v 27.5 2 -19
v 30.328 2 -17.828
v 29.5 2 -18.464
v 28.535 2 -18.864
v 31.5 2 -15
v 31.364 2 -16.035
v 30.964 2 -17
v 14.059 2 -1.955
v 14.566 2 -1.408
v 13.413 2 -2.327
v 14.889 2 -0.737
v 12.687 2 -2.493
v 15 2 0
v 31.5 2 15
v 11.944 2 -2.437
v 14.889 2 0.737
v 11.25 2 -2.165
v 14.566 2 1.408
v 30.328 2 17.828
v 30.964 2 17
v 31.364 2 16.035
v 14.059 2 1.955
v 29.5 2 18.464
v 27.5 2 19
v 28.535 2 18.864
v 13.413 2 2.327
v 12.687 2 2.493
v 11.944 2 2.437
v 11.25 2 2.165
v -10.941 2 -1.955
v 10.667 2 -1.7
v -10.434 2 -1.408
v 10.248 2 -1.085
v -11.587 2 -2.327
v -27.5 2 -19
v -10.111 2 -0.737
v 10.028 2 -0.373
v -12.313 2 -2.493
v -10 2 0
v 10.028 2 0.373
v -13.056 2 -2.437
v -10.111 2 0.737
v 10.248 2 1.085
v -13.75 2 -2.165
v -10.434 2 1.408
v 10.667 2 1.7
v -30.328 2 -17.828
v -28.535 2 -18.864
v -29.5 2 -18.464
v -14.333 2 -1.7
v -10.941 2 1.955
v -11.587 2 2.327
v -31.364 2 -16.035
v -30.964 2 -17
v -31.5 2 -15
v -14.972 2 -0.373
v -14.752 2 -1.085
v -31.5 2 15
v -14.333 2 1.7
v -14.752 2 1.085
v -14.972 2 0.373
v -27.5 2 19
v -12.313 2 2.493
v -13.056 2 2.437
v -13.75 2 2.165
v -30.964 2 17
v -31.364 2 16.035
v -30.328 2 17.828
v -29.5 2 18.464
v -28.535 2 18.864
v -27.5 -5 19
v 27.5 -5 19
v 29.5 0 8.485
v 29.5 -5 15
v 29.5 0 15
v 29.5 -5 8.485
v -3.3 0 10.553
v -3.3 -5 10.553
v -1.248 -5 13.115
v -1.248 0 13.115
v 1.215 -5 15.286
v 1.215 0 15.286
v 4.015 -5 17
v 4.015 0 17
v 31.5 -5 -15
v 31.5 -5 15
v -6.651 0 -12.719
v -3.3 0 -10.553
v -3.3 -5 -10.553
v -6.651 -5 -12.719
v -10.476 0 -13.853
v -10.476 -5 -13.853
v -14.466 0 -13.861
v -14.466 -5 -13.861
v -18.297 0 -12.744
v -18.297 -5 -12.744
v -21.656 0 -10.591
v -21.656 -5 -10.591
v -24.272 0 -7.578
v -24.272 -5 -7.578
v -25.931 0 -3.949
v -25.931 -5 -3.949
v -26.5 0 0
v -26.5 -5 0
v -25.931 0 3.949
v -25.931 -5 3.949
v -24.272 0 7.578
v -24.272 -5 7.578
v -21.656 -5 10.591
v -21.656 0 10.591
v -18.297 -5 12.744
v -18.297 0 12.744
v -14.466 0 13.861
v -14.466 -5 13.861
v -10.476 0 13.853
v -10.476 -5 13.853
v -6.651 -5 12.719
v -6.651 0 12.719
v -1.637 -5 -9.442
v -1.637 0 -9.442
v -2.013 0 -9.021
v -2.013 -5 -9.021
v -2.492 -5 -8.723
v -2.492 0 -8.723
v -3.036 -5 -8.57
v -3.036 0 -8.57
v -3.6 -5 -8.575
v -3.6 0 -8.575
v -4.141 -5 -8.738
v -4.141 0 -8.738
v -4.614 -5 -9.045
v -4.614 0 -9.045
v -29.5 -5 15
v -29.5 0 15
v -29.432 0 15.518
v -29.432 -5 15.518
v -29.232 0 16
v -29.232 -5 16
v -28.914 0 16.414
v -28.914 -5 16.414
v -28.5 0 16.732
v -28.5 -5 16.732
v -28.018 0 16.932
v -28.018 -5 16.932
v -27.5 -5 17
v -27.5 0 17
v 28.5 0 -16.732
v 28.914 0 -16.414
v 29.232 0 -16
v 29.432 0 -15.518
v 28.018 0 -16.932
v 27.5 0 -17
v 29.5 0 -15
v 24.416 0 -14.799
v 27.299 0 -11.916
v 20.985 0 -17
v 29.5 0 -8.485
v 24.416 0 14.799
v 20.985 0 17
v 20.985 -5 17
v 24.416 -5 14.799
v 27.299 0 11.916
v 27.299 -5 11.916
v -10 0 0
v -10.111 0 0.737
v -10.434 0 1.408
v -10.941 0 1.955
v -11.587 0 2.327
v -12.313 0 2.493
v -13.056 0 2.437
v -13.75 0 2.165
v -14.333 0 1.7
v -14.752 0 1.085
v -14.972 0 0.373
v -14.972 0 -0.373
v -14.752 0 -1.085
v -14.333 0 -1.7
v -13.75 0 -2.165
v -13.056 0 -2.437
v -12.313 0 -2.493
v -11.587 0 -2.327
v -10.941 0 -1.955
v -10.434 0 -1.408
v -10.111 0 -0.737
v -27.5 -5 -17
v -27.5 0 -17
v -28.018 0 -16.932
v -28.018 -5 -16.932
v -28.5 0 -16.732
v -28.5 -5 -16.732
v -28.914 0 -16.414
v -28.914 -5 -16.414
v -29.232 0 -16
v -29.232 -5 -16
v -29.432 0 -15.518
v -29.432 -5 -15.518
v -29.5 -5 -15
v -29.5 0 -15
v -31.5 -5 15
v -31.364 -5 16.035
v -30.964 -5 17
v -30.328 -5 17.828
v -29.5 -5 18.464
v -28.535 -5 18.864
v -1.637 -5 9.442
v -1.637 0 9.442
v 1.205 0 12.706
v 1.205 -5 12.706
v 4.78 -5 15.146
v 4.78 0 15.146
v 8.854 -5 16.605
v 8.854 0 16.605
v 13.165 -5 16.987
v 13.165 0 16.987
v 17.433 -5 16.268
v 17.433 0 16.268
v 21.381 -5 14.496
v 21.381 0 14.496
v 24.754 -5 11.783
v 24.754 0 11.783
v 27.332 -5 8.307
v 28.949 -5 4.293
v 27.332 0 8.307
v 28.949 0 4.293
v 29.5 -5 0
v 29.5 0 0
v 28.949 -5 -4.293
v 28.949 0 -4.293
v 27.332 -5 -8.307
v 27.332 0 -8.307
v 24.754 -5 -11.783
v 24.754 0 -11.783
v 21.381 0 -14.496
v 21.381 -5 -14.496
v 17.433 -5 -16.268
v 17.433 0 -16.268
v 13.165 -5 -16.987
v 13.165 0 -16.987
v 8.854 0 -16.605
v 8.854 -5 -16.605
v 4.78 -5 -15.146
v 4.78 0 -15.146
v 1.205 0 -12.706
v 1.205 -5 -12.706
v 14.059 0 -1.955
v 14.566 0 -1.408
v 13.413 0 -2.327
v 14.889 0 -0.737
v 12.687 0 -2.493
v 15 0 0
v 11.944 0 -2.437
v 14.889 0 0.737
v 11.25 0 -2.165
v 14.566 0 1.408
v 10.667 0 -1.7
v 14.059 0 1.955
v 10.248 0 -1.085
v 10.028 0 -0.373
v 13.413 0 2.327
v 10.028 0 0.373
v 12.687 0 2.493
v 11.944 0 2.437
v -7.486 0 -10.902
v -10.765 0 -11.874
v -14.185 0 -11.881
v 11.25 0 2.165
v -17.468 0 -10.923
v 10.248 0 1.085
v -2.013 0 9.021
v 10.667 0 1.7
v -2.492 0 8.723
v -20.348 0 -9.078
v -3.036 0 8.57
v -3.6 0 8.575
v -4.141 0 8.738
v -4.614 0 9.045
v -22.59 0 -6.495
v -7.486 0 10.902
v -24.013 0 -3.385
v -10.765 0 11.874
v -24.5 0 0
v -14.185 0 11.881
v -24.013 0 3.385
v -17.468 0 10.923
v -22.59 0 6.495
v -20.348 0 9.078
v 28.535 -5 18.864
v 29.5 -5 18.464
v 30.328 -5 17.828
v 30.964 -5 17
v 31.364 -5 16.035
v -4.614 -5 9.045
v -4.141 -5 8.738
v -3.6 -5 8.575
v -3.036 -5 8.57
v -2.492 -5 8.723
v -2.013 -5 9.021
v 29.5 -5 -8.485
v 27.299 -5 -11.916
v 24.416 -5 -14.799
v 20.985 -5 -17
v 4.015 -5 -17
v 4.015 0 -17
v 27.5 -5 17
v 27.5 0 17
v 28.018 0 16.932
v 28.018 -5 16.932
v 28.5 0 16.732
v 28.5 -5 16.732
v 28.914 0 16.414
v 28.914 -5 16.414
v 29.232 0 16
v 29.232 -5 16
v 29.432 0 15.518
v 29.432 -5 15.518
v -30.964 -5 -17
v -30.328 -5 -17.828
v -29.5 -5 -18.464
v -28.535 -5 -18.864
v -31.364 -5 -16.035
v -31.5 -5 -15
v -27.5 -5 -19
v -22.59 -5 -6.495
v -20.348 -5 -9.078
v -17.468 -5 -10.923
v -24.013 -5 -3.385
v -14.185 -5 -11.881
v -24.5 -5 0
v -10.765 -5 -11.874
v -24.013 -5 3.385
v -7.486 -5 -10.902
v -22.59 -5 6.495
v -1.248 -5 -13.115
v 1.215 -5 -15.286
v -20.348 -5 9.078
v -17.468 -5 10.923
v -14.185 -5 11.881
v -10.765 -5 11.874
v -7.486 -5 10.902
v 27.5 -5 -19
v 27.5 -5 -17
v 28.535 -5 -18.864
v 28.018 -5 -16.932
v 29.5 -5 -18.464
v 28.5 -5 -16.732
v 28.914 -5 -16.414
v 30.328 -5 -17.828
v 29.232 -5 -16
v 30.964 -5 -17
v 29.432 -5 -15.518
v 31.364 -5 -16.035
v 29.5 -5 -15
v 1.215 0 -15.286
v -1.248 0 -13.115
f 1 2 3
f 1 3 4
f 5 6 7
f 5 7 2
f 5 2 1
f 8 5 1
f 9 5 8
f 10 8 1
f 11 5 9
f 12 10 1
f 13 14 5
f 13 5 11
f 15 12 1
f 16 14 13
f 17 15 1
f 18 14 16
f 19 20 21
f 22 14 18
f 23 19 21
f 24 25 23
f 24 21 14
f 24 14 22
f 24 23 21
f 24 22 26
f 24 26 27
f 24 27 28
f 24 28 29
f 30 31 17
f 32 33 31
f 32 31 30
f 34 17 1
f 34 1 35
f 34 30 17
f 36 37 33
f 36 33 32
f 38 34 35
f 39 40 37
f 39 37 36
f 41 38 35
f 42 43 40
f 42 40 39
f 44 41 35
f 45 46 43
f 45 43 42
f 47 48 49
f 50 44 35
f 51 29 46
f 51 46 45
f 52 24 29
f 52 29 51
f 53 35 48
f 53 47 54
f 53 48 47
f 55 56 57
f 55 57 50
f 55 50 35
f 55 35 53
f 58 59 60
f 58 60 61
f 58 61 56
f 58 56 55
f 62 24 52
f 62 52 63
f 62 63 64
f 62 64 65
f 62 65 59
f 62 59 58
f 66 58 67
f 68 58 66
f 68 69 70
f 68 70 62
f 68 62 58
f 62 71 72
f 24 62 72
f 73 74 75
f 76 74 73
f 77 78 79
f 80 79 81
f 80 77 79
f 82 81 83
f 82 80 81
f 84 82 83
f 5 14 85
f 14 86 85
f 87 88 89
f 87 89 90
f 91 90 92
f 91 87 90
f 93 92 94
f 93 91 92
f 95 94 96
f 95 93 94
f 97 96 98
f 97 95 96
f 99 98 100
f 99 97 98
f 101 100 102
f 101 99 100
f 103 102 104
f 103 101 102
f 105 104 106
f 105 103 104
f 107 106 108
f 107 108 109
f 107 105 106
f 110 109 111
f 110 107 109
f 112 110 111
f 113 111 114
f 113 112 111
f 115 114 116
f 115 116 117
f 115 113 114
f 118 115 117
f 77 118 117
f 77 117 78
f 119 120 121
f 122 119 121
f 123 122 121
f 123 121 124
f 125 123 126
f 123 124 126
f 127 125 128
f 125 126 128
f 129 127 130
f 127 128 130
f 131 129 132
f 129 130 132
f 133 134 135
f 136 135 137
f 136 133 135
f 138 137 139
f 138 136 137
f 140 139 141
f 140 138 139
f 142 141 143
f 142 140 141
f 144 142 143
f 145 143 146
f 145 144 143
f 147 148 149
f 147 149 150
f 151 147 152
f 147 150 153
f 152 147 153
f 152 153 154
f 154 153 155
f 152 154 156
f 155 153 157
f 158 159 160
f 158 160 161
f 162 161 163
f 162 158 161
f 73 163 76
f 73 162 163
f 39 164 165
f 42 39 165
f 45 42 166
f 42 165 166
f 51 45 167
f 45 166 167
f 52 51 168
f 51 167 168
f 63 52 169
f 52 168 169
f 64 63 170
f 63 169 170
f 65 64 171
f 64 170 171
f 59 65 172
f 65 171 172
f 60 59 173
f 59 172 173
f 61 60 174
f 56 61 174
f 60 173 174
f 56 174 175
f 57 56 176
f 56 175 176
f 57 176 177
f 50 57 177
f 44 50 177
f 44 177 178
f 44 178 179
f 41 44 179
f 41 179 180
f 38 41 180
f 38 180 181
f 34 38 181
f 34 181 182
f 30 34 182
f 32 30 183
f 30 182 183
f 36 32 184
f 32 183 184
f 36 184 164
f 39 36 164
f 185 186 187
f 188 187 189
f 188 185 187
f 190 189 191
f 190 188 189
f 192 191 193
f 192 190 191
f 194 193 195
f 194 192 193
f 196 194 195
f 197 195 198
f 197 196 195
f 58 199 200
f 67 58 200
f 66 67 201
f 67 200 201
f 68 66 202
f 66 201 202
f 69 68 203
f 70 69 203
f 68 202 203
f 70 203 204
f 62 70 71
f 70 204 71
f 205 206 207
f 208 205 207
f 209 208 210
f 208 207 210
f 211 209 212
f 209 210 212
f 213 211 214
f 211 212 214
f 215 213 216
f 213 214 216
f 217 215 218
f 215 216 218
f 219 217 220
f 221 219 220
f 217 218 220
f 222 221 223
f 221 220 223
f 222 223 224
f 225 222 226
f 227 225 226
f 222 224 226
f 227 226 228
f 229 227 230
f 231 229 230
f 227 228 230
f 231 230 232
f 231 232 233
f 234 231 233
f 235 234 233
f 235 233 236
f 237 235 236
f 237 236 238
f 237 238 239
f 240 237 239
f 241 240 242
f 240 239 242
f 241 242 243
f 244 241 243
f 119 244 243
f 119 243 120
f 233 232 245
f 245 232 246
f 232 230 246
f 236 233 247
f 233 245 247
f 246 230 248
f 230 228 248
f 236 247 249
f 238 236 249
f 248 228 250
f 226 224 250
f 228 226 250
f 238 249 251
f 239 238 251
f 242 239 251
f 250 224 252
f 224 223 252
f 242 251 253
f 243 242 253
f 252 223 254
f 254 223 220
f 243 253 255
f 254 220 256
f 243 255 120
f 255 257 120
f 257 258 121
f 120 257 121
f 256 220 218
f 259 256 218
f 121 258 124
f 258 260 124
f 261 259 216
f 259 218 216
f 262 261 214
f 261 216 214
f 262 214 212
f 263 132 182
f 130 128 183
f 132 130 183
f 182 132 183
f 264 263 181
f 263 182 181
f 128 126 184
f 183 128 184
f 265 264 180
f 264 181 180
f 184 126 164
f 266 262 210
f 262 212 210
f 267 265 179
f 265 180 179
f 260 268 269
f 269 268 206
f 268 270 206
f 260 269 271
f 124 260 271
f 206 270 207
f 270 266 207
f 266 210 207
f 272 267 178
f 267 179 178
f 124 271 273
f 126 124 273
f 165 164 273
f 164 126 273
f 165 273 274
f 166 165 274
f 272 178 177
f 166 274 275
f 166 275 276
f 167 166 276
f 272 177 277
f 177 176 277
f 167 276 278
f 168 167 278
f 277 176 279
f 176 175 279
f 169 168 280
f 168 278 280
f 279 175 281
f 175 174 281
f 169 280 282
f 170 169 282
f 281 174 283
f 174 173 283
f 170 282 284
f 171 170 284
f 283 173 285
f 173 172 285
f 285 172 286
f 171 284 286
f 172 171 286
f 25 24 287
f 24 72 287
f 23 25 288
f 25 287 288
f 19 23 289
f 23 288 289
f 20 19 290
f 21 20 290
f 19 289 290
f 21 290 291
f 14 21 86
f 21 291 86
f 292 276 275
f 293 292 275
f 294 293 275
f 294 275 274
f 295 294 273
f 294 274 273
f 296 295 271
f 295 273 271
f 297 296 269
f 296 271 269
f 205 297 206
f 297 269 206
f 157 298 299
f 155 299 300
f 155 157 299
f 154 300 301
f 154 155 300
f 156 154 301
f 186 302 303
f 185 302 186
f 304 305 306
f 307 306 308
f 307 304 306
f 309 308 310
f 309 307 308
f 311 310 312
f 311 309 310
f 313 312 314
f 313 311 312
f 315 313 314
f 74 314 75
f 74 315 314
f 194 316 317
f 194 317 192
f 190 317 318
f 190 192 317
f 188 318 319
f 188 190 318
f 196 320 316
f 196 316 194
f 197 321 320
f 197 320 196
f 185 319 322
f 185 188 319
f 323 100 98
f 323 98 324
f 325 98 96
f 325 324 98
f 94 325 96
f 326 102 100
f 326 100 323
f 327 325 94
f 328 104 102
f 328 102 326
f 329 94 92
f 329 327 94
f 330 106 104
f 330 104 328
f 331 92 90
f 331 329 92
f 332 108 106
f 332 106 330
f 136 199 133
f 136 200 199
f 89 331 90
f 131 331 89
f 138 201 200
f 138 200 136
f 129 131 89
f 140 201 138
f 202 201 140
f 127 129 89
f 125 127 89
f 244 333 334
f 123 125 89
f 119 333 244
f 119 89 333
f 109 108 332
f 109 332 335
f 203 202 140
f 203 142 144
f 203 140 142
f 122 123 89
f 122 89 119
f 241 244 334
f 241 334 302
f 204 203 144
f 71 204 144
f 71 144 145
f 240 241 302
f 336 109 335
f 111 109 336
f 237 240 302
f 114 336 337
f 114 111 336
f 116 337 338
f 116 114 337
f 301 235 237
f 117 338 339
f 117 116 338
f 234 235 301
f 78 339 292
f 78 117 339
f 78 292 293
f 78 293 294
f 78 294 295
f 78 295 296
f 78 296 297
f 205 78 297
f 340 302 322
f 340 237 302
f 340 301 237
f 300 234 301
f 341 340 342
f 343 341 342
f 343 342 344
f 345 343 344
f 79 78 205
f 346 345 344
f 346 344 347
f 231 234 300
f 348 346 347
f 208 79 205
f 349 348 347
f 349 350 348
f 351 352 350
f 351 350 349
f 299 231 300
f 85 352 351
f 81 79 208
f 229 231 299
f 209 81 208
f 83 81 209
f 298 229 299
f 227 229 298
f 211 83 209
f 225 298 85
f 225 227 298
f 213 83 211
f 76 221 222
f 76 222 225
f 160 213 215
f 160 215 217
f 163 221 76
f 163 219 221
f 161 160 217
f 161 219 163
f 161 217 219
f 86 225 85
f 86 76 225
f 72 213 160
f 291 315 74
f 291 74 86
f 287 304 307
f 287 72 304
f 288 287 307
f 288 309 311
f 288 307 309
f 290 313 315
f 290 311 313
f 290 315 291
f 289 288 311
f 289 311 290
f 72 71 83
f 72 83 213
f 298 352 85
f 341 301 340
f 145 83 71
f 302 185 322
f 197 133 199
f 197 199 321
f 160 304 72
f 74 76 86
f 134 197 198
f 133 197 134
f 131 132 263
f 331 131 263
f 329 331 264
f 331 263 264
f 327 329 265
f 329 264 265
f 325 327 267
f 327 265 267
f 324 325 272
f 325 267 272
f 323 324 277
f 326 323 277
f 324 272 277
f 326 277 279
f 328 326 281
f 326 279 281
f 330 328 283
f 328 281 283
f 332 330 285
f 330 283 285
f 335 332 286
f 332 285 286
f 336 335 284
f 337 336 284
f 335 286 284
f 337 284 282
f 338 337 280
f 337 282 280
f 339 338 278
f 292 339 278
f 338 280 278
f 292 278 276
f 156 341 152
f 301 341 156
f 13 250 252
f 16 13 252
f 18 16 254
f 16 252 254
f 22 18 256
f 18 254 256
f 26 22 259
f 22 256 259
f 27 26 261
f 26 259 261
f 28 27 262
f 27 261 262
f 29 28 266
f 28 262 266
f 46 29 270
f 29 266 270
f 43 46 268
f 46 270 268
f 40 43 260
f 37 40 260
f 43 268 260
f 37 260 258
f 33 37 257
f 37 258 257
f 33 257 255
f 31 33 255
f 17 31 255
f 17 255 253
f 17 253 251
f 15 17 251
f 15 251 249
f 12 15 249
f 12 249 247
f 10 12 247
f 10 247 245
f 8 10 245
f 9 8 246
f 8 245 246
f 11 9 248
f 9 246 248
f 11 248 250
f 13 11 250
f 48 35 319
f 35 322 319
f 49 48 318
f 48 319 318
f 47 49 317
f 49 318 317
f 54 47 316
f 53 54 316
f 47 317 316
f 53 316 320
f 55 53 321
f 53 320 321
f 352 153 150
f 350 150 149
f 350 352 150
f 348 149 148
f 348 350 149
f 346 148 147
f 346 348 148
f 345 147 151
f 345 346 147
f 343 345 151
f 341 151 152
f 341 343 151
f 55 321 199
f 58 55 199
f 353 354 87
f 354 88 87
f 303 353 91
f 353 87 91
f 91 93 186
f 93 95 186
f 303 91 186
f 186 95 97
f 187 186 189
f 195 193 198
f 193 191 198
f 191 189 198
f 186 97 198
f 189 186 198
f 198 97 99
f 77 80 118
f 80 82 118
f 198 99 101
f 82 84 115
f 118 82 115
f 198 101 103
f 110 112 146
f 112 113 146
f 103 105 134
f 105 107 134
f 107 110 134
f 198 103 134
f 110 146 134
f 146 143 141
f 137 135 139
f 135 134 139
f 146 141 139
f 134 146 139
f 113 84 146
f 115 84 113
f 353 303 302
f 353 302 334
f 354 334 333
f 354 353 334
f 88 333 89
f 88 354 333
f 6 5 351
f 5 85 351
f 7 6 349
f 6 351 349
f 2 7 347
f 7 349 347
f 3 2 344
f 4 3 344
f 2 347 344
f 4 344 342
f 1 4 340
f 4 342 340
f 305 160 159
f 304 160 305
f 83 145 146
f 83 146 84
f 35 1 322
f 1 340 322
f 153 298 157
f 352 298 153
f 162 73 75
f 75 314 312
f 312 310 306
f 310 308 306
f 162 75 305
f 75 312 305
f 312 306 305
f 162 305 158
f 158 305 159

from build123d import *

# Parameters (mm, degrees)
F1_DEPTH     = 5
F3_DEPTH     = 2
F4_T         = 2
F4_T4_ANGLE  = 97.3436104927
F4_T6_ANGLE  = 292.5225547035
F4_T8_ANGLE  = 97.3436104927
F4_T10_ANGLE = 262.1646662819
F5_R         = 2.5
F6_DEPTH     = 2


# Not quite as in the source:
# - a shell that OpenCascade refuses in one call is made with other operations: the cavity is built on its own and cut out


with BuildPart() as f1:
    # F0 (on Front) → F1 (new body)
    with BuildSketch(Plane.XZ):
        with BuildLine():
            ThreePointArc((31.5, 15), (30.3284271247, 17.8284271247), (27.5, 19))
            Line((27.5, 19), (-27.5, 19))
            ThreePointArc((-27.5, 19), (-30.3284271247, 17.8284271247), (-31.5, 15))
            Line((-31.5, 15), (-31.5, -15))
            ThreePointArc((-31.5, -15), (-30.3284271247, -17.8284271247), (-27.5, -19))
            Line((-27.5, -19), (27.5, -19))
            ThreePointArc((27.5, -19), (30.3284271247, -17.8284271247), (31.5, -15))
            Line((31.5, -15), (31.5, 15))
        make_face()
        with BuildLine():
            ThreePointArc((-1.6368421053, 9.4419116333), (29.5, 0), (-1.6368421053, -9.4419116333))
            ThreePointArc((-1.6368421053, -9.4419116333), (-3.0358514886, -8.5702451163), (-4.6142857143, -9.0451926571))
            ThreePointArc((-4.6142857143, -9.0451926571), (-24.5, 0), (-4.6142857143, 9.0451926571))
            ThreePointArc((-4.6142857143, 9.0451926571), (-3.0358514886, 8.5702451163), (-1.6368421053, 9.4419116333))
        make_face(mode=Mode.SUBTRACT)
    extrude(amount=F1_DEPTH)

    # F2 (on face) → F3 (join)
    with BuildSketch(Plane(origin=(0, 0, 0), x_dir=(-1, 0, 0), z_dir=(0, 1, 0))):
        with BuildLine():
            Line((27.5, 19), (-27.5, 19))
            ThreePointArc((-27.5, 19), (-30.3284271247, 17.8284271247), (-31.5, 15))
            Line((-31.5, 15), (-31.5, -15))
            ThreePointArc((-31.5, -15), (-30.3284271247, -17.8284271247), (-27.5, -19))
            Line((-27.5, -19), (27.5, -19))
            ThreePointArc((27.5, -19), (30.3284271247, -17.8284271247), (31.5, -15))
            Line((31.5, -15), (31.5, 15))
            ThreePointArc((31.5, 15), (30.3284271247, 17.8284271247), (27.5, 19))
        make_face()
    extrude(amount=F3_DEPTH)

    # F4: shell of thickness 2, made by hand


with BuildPart() as f4_core1:
    # F4_t2: copy of F1
    add(f1.part)

    # the walls: a layer under each face that stays
    f4_faces = [f4_core1.faces().sort_by_distance(p)[0] for p in [
        (30.3284271247, -1.5, 17.8284271247),
        (0, 2, 0),
        (-30.3284271247, -1.5, 17.8284271247),
        (-31.5, -1.5, 0),
        (-30.3284271247, -1.5, -17.8284271247),
        (0, -1.5, -19),
        (30.3284271247, -1.5, -17.8284271247),
        (0, -1.5, 19),
        (2.5, 0, 0),
        (29.5, -2.5, 0),
        (-24.5, -2.5, 0),
        (31.5, -1.5, 0),
    ]]
    thicken(f4_faces, amount=-F4_T, mode=Mode.SUBTRACT)

    # F4_s3 → F4_t4 (revolve, cut)
    with BuildSketch(Plane(origin=(3.8559556787, 0, -5.7733051009), x_dir=(0, 1, 0), z_dir=(0.5554065667, 0, -0.8315789474))):
        Polygon((-0.02, -6.5852631579), (0, -8.6052631579), (2, -8.6052631579), (2, -6.6052631579), align=None)
    revolve(axis=Axis((-3.3, 0, -10.5527247666), (0, -1, 0)), revolution_arc=F4_T4_ANGLE, mode=Mode.SUBTRACT)

    # F4_s5 → F4_t6 (revolve, cut)
    with BuildSketch(Plane(origin=(3.8559556787, 0, 5.7733051009), x_dir=(0, 1, 0), z_dir=(-0.5554065667, 0, -0.8315789474))):
        Polygon((-0.02, -6.5852631579), (2, -6.6052631579), (2, -8.6052631579), (0, -8.6052631579), align=None)
    revolve(axis=Axis((12.5, 0, 0), (0, 1, 0)), revolution_arc=F4_T6_ANGLE, mode=Mode.SUBTRACT)

    # F4_s7 → F4_t8 (revolve, cut)
    with BuildSketch(Plane(origin=(-7.1020408163, 0, 6.1916497355), x_dir=(0, 1, 0), z_dir=(-0.7537660548, 0, 0.6571428571))):
        Polygon((-0.02, -3.7657142857), (2, -3.7857142857), (2, -5.7857142857), (0, -5.7857142857), align=None)
    revolve(axis=Axis((-3.3, 0, 10.5527247666), (0, -1, 0)), revolution_arc=F4_T8_ANGLE, mode=Mode.SUBTRACT)

    # F4_s9 → F4_t10 (revolve, cut)
    with BuildSketch(Plane(origin=(-7.1020408163, 0, -6.1916497355), x_dir=(0, 1, 0), z_dir=(0.7537660548, 0, 0.6571428571))):
        Polygon((-0.02, -3.7657142857), (2, -3.7857142857), (2, -5.7857142857), (0, -5.7857142857), align=None)
    revolve(axis=Axis((-12.5, 0, 0), (0, 1, 0)), revolution_arc=F4_T10_ANGLE, mode=Mode.SUBTRACT)


with BuildPart() as f1_1:
    add(f1.part)

    # what is left inside the walls is the cavity
    f4_cavity = [f4_core1.part.solids().sort_by_distance(p)[0] for p in [
        (25.949171, -3.333333, 13.449171),
        (25.949171, -3.333333, -13.449171),
        (-21.12132, -0.02, -13.222222),
    ]]
    add(f4_cavity, mode=Mode.SUBTRACT)

    # F5 (on face) → F6 (cut, through all)
    with BuildSketch(Plane.XZ):
        with Locations((-12.5, 0)):
            Circle(F5_R)
        with Locations((12.5, 0)):
            Circle(F5_R)
    extrude(amount=-F6_DEPTH, mode=Mode.SUBTRACT)


solid = f1_1.part
